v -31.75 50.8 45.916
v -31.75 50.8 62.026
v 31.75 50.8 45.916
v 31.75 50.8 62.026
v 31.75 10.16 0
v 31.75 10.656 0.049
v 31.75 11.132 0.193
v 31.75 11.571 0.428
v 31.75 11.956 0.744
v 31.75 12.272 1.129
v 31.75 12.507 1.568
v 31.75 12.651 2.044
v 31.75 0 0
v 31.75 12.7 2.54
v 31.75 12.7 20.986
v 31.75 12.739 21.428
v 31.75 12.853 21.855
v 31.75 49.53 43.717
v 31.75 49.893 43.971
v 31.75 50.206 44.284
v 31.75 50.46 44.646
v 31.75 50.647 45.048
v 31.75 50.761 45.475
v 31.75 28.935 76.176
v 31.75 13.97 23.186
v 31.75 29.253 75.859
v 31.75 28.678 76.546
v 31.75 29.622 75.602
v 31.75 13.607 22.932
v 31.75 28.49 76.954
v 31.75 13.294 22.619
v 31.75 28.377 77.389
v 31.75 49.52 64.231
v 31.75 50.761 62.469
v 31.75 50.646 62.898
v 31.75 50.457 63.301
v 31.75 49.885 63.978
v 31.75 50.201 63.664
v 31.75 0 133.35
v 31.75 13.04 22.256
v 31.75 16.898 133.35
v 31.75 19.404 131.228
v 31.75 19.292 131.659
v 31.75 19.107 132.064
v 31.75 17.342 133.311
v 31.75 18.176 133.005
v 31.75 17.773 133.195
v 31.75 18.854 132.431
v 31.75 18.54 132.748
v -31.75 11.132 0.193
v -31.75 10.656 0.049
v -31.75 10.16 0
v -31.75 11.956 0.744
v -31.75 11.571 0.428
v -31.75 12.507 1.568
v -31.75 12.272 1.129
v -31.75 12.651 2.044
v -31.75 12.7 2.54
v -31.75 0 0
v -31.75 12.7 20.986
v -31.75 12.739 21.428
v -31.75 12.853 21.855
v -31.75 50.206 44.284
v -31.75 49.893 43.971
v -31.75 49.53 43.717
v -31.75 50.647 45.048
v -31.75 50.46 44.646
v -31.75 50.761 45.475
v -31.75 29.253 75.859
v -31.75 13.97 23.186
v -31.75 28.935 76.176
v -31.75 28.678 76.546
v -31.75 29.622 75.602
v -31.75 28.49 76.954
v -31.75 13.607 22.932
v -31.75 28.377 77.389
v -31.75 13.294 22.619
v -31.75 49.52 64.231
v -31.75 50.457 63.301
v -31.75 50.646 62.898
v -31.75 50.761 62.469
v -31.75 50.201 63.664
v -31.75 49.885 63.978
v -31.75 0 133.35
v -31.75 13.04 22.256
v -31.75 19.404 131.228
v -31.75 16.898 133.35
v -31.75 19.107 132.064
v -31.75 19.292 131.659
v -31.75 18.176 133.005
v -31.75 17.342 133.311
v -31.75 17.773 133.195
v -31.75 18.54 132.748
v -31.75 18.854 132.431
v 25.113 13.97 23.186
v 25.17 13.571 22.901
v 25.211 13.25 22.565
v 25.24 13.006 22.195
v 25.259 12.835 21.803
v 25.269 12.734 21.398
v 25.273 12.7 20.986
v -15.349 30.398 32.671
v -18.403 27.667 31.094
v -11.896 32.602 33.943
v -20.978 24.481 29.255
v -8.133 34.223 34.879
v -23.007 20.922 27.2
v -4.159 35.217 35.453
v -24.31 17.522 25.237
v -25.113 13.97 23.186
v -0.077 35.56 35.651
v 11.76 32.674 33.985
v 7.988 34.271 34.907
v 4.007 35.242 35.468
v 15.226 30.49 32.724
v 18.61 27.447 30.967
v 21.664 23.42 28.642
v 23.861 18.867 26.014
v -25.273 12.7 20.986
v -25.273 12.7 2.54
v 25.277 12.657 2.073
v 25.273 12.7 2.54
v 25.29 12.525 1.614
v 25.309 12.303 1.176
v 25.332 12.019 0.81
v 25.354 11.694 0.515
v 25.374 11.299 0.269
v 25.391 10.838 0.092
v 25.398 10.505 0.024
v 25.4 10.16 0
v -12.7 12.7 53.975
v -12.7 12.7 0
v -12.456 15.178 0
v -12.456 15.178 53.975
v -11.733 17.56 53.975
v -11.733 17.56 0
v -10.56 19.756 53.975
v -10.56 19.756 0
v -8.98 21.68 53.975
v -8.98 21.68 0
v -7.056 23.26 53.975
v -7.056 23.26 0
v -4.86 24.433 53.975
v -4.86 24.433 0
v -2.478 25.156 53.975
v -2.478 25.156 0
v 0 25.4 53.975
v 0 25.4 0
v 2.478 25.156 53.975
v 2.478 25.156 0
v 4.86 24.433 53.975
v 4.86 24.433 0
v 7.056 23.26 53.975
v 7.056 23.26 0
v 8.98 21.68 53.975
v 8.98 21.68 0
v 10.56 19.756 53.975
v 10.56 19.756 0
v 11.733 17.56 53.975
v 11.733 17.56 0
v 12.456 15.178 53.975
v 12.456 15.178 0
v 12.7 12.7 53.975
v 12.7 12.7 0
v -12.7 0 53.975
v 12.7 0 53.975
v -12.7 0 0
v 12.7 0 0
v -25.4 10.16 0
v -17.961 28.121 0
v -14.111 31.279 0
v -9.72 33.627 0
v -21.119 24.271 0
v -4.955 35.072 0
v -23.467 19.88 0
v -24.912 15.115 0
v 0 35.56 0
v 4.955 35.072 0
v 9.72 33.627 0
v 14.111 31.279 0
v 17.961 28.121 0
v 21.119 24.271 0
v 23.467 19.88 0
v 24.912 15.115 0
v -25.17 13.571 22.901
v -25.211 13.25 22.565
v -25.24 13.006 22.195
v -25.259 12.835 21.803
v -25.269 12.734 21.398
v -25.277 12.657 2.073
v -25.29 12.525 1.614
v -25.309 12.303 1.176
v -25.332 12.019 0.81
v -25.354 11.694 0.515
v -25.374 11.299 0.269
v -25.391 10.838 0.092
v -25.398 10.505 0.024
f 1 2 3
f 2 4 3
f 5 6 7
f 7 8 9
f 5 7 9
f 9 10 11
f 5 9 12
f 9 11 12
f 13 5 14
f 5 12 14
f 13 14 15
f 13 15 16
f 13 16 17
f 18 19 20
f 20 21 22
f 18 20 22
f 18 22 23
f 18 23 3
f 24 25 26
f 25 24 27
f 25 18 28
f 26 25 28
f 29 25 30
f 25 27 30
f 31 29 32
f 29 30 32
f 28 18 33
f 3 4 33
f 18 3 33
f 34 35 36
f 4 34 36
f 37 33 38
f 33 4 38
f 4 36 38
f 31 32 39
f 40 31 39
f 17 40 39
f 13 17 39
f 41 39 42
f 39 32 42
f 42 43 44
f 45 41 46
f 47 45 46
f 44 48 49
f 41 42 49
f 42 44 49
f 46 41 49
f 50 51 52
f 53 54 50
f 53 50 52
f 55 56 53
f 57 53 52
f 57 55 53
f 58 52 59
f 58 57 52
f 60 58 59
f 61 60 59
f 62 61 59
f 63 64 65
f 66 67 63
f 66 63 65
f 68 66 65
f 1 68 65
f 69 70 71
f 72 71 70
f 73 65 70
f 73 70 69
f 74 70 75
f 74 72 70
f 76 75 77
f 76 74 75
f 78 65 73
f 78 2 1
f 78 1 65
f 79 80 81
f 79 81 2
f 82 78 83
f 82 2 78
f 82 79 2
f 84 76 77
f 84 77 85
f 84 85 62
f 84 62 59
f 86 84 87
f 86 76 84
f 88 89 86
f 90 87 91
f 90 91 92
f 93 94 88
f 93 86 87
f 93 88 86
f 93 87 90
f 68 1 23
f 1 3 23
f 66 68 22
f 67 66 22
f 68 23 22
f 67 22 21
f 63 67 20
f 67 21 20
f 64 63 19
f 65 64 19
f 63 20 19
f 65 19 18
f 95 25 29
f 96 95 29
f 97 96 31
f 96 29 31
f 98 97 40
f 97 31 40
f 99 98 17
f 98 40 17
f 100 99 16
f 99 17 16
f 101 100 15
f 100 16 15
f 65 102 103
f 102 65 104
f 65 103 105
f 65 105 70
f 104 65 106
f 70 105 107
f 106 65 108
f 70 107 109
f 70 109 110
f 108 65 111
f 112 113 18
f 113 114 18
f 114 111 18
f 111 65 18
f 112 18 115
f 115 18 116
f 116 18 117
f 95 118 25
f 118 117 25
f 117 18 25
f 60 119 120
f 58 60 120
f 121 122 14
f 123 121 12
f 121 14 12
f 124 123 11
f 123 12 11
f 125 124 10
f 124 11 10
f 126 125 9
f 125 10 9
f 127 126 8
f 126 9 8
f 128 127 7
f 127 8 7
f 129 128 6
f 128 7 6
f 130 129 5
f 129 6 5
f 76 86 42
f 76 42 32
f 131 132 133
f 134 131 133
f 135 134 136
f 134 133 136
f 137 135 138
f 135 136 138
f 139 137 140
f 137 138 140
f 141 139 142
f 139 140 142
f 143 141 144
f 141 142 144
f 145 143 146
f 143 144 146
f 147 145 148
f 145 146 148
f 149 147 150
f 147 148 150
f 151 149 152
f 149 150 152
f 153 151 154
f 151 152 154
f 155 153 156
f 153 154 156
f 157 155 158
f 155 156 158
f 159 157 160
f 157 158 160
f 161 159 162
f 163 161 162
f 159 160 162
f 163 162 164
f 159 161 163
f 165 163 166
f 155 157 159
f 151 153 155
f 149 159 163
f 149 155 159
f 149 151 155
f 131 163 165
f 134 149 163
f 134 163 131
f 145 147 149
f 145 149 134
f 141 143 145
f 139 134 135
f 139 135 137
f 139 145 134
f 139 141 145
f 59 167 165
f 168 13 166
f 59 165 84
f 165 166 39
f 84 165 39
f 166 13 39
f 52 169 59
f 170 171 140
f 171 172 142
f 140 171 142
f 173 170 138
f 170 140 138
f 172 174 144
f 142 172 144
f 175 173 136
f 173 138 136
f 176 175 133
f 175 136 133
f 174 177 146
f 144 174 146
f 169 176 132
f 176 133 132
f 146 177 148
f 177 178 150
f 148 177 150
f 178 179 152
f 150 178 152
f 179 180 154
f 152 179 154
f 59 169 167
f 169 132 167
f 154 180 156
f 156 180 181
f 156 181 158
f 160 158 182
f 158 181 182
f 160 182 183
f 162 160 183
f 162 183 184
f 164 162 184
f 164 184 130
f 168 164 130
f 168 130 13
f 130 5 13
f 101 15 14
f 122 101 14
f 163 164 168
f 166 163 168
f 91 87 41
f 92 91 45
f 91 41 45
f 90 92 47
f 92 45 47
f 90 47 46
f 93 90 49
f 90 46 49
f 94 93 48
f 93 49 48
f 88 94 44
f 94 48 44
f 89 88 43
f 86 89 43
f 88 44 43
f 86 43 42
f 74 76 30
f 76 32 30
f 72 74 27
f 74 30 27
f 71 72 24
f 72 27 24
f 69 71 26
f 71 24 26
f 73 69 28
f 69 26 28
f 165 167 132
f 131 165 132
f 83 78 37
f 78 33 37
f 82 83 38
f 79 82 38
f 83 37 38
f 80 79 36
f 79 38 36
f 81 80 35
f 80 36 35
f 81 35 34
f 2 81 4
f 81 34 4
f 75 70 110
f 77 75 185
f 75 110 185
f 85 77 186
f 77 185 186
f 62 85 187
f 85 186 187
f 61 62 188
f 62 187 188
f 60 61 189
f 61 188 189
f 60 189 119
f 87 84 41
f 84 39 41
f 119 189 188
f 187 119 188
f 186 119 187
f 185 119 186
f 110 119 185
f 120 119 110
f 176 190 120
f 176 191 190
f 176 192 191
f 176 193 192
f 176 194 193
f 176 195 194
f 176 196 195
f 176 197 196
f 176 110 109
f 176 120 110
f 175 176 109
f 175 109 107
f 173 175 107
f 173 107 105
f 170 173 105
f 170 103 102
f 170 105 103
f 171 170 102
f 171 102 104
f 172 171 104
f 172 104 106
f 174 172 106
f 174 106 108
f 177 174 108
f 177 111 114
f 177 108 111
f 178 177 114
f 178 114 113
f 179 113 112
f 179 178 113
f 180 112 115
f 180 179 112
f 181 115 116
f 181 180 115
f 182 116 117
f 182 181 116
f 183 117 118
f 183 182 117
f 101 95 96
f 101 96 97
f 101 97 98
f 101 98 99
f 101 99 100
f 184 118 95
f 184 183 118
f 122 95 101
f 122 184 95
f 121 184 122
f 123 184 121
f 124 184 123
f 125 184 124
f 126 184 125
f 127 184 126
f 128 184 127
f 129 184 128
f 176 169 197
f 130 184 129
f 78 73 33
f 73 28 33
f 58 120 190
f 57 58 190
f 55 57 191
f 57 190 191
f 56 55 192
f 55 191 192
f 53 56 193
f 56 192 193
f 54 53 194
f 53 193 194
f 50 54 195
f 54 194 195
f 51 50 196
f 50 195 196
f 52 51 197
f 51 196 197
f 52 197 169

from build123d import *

# Parameters (mm, degrees)
BOSS_EXTRUDE1_DEPTH = 31.75
BOSS_EXTRUDE2_REACH = 148.188
CUT_EXTRUDE1_DEPTH  = 53.975


with BuildPart() as part:
    # Sketch1 → Boss-Extrude1 (new, symmetric)
    with BuildSketch(Plane(origin=(0, 0, 0), x_dir=(0, 0, -1), z_dir=(1, 0, 0))):
        with BuildLine():
            Line((0, 0), (-133.35, 0))
            Line((-133.35, 0), (-133.35, 16.898297196))
            ThreePointArc((-133.35, 16.898297196), (-132.748070755, 18.540089432), (-131.227573428, 19.403737762))
            Line((-131.227573428, 19.403737762), (-77.389477645, 28.376753726))
            ThreePointArc((-77.389477645, 28.376753726), (-76.355301792, 28.797962054), (-75.601713492, 29.622001389))
            Line((-75.601713492, 29.622001389), (-64.231318341, 49.520192903))
            ThreePointArc((-64.231318341, 49.520192903), (-63.300874878, 50.456871637), (-62.02598076, 50.8))
            Line((-62.02598076, 50.8), (-45.916469684, 50.8))
            ThreePointArc((-45.916469684, 50.8), (-44.646469684, 50.459704526), (-43.716765158, 49.53))
            Line((-43.716765158, 49.53), (-23.186189586, 13.97))
            ThreePointArc((-23.186189586, 13.97), (-22.25648506, 13.040295474), (-20.98648506, 12.7))
            Line((-20.98648506, 12.7), (-2.54, 12.7))
            ThreePointArc((-2.54, 12.7), (-0.743948776, 11.956051224), (0, 10.16))
            Line((0, 10.16), (0, 0))
        make_face()
    extrude(amount=BOSS_EXTRUDE1_DEPTH, both=True)

    # Sketch2 → Boss-Extrude2 (add, up to next)
    with BuildSketch(Plane(origin=(0, 0, 0), x_dir=(-1, 0, 0), z_dir=(0, 0, -1)), mode=Mode.PRIVATE) as boss_extrude2_sk1:
        with BuildLine():
            Line((-31.75, 0), (-12.7, 0))
            Line((-12.7, 0), (12.7, 0))
            Line((12.7, 0), (31.75, 0))
            Line((31.75, 0), (31.75, 10.16))
            Line((31.75, 10.16), (25.4, 10.16))
            ThreePointArc((25.4, 10.16), (0, 35.56), (-25.4, 10.16))
            Line((-25.4, 10.16), (-31.75, 10.16))
            Line((-31.75, 10.16), (-31.75, 0))
        make_face()
    boss_extrude2_tool1 = extrude(boss_extrude2_sk1.sketch, amount=-BOSS_EXTRUDE2_REACH, mode=Mode.PRIVATE) - part.part
    add(boss_extrude2_tool1.solids().sort_by_distance((0, 14.770763, 0))[0])

    # Sketch3 → Cut-Extrude1 (cut)
    with BuildSketch(Plane(origin=(0, 0, 0), x_dir=(-1, 0, 0), z_dir=(0, 0, -1))):
        with BuildLine():
            Line((-12.7, 0), (12.7, 0))
            Line((12.7, 0), (12.7, 12.7))
            ThreePointArc((12.7, 12.7), (0, 25.4), (-12.7, 12.7))
            Line((-12.7, 12.7), (-12.7, 0))
        make_face()
    extrude(amount=-CUT_EXTRUDE1_DEPTH, mode=Mode.SUBTRACT)


solid = part.part
